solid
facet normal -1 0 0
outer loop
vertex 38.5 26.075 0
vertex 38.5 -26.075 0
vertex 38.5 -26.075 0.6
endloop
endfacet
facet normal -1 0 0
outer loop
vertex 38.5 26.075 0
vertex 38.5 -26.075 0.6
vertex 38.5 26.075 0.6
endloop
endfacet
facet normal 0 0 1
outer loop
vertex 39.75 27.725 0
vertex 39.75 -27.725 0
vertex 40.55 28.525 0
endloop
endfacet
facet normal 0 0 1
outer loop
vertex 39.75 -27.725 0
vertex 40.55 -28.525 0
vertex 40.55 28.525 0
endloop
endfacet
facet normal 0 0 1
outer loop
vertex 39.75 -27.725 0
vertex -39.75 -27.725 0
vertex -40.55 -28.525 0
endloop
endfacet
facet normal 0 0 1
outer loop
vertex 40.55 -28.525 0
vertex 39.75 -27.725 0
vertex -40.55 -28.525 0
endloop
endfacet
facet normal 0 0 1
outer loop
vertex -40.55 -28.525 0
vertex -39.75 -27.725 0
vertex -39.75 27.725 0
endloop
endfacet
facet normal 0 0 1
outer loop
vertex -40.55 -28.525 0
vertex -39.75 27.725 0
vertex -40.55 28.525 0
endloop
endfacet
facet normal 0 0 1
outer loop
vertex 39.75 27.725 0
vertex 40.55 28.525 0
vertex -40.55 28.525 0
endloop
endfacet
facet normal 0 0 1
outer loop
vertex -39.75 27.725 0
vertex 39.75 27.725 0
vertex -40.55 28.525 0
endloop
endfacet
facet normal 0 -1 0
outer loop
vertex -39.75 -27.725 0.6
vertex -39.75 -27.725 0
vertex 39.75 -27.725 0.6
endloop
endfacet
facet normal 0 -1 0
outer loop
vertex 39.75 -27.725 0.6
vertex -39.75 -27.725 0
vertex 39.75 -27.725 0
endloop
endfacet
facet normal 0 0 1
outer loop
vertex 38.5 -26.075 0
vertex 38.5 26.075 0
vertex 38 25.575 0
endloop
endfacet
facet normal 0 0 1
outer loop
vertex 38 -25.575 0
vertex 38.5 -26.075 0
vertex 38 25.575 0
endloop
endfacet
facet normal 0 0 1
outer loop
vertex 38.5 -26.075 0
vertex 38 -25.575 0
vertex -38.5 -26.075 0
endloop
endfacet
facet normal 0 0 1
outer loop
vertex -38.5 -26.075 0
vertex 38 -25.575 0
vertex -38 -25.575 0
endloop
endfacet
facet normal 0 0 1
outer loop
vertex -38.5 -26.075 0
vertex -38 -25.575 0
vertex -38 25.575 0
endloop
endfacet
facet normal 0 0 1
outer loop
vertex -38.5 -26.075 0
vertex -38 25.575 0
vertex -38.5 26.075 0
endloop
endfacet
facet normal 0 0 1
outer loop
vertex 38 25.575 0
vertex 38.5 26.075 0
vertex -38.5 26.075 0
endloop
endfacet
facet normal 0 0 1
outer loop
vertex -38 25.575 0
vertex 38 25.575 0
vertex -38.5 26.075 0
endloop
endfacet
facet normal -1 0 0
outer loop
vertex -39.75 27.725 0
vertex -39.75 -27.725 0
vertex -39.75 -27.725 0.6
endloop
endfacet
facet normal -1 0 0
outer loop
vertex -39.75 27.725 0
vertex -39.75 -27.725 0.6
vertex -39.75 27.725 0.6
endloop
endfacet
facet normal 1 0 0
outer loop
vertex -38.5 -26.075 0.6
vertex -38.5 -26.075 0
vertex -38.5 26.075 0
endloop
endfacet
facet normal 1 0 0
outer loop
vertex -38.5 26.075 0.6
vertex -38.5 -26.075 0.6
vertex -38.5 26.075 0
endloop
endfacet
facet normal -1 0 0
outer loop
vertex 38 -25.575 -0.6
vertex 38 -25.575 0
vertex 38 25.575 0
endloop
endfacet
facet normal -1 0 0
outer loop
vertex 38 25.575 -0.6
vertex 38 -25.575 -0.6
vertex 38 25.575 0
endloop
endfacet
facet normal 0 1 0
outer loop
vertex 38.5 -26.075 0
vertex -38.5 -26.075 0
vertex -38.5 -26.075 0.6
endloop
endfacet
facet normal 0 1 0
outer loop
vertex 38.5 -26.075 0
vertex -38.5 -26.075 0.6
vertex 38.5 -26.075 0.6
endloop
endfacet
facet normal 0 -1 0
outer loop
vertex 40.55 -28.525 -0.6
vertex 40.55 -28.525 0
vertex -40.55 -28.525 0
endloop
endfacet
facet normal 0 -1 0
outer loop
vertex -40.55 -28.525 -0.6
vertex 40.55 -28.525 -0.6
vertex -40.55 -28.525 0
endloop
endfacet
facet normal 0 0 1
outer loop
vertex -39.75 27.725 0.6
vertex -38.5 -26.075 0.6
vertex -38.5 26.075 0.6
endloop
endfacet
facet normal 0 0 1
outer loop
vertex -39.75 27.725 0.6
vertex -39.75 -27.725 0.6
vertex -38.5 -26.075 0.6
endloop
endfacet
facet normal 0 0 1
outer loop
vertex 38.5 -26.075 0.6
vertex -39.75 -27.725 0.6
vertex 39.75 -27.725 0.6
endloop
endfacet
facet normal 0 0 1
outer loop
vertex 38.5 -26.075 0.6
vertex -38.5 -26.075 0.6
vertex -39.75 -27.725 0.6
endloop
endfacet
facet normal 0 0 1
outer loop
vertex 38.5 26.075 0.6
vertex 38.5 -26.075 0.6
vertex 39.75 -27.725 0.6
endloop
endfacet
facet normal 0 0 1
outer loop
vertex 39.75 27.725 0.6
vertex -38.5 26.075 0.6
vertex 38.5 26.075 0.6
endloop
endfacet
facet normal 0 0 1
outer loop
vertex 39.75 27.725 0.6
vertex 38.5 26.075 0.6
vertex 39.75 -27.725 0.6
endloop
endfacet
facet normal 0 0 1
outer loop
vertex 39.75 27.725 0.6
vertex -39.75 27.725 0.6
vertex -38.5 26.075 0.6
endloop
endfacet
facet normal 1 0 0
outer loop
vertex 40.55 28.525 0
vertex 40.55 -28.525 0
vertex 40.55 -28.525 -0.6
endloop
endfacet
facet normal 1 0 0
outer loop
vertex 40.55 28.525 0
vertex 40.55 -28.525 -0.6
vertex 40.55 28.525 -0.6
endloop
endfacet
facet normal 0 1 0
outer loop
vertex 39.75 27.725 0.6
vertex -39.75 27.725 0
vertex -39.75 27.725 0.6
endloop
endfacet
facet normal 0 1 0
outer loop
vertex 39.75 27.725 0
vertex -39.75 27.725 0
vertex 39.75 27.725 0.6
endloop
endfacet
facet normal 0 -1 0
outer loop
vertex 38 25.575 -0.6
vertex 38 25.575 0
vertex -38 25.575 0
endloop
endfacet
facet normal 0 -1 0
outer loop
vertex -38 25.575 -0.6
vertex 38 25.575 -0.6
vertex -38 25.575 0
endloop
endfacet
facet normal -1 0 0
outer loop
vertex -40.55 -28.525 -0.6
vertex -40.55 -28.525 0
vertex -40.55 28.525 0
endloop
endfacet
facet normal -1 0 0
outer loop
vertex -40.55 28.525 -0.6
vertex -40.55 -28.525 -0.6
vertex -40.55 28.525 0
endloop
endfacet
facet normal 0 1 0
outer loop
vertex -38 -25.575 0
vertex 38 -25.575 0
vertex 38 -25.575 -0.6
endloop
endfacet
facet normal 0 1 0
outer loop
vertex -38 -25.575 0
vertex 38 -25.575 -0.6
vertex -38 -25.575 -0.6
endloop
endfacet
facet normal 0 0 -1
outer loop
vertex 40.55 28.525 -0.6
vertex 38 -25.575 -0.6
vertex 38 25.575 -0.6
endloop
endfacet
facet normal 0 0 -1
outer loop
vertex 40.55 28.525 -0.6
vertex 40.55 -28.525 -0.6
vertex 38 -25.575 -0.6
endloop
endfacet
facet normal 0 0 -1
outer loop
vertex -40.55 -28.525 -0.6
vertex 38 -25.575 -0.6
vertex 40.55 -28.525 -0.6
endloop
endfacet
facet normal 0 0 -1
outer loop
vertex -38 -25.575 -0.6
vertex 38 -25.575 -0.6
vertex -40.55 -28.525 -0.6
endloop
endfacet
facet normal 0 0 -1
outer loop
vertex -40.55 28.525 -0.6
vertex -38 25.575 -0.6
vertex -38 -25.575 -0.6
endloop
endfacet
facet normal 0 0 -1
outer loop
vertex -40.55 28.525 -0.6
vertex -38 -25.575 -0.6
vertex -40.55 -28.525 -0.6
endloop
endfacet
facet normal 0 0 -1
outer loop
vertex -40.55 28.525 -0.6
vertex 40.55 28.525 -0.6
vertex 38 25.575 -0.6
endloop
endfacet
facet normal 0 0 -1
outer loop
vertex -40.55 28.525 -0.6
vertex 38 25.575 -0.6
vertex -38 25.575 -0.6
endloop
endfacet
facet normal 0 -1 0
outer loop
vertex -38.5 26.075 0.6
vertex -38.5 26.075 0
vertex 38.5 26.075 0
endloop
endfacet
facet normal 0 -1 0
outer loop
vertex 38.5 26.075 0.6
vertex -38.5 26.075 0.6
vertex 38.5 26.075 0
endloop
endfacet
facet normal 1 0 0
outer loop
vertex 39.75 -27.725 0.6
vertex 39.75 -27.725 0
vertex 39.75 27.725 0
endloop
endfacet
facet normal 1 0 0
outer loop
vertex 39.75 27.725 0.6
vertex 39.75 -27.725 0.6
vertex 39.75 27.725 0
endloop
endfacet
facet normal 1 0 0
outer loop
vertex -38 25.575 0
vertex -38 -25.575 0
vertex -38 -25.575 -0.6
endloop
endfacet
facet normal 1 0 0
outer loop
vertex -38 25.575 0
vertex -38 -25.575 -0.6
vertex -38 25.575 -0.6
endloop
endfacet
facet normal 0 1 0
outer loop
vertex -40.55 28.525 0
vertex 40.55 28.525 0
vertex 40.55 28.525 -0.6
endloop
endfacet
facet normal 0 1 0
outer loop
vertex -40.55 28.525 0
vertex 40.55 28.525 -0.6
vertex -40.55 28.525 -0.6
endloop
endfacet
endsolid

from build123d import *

# Parameters (mm, degrees)
SKETCH1_W           = 79.5
SKETCH1_H           = 55.45
SKETCH1_W_2         = 77
SKETCH1_H_2         = 52.15
BOSS_EXTRUDE1_DEPTH = 0.6
SKETCH2_W           = 81.1
SKETCH2_H           = 57.05
SKETCH2_W_2         = 76
SKETCH2_H_2         = 51.15
BOSS_EXTRUDE2_DEPTH = 0.6


with BuildPart() as part:
    # Sketch1 → Boss-Extrude1 (new body)
    with BuildSketch(Plane.XY):
        Rectangle(SKETCH1_W, SKETCH1_H)
        Rectangle(SKETCH1_W_2, SKETCH1_H_2, mode=Mode.SUBTRACT)
    extrude(amount=BOSS_EXTRUDE1_DEPTH)

    # Sketch2 → Boss-Extrude2 (add)
    with BuildSketch(Plane(origin=(0, 0, 0), x_dir=(-1, 0, 0), z_dir=(0, 0, -1))):
        Rectangle(SKETCH2_W, SKETCH2_H)
        Rectangle(SKETCH2_W_2, SKETCH2_H_2, mode=Mode.SUBTRACT)
    extrude(amount=BOSS_EXTRUDE2_DEPTH)


solid = part.part
